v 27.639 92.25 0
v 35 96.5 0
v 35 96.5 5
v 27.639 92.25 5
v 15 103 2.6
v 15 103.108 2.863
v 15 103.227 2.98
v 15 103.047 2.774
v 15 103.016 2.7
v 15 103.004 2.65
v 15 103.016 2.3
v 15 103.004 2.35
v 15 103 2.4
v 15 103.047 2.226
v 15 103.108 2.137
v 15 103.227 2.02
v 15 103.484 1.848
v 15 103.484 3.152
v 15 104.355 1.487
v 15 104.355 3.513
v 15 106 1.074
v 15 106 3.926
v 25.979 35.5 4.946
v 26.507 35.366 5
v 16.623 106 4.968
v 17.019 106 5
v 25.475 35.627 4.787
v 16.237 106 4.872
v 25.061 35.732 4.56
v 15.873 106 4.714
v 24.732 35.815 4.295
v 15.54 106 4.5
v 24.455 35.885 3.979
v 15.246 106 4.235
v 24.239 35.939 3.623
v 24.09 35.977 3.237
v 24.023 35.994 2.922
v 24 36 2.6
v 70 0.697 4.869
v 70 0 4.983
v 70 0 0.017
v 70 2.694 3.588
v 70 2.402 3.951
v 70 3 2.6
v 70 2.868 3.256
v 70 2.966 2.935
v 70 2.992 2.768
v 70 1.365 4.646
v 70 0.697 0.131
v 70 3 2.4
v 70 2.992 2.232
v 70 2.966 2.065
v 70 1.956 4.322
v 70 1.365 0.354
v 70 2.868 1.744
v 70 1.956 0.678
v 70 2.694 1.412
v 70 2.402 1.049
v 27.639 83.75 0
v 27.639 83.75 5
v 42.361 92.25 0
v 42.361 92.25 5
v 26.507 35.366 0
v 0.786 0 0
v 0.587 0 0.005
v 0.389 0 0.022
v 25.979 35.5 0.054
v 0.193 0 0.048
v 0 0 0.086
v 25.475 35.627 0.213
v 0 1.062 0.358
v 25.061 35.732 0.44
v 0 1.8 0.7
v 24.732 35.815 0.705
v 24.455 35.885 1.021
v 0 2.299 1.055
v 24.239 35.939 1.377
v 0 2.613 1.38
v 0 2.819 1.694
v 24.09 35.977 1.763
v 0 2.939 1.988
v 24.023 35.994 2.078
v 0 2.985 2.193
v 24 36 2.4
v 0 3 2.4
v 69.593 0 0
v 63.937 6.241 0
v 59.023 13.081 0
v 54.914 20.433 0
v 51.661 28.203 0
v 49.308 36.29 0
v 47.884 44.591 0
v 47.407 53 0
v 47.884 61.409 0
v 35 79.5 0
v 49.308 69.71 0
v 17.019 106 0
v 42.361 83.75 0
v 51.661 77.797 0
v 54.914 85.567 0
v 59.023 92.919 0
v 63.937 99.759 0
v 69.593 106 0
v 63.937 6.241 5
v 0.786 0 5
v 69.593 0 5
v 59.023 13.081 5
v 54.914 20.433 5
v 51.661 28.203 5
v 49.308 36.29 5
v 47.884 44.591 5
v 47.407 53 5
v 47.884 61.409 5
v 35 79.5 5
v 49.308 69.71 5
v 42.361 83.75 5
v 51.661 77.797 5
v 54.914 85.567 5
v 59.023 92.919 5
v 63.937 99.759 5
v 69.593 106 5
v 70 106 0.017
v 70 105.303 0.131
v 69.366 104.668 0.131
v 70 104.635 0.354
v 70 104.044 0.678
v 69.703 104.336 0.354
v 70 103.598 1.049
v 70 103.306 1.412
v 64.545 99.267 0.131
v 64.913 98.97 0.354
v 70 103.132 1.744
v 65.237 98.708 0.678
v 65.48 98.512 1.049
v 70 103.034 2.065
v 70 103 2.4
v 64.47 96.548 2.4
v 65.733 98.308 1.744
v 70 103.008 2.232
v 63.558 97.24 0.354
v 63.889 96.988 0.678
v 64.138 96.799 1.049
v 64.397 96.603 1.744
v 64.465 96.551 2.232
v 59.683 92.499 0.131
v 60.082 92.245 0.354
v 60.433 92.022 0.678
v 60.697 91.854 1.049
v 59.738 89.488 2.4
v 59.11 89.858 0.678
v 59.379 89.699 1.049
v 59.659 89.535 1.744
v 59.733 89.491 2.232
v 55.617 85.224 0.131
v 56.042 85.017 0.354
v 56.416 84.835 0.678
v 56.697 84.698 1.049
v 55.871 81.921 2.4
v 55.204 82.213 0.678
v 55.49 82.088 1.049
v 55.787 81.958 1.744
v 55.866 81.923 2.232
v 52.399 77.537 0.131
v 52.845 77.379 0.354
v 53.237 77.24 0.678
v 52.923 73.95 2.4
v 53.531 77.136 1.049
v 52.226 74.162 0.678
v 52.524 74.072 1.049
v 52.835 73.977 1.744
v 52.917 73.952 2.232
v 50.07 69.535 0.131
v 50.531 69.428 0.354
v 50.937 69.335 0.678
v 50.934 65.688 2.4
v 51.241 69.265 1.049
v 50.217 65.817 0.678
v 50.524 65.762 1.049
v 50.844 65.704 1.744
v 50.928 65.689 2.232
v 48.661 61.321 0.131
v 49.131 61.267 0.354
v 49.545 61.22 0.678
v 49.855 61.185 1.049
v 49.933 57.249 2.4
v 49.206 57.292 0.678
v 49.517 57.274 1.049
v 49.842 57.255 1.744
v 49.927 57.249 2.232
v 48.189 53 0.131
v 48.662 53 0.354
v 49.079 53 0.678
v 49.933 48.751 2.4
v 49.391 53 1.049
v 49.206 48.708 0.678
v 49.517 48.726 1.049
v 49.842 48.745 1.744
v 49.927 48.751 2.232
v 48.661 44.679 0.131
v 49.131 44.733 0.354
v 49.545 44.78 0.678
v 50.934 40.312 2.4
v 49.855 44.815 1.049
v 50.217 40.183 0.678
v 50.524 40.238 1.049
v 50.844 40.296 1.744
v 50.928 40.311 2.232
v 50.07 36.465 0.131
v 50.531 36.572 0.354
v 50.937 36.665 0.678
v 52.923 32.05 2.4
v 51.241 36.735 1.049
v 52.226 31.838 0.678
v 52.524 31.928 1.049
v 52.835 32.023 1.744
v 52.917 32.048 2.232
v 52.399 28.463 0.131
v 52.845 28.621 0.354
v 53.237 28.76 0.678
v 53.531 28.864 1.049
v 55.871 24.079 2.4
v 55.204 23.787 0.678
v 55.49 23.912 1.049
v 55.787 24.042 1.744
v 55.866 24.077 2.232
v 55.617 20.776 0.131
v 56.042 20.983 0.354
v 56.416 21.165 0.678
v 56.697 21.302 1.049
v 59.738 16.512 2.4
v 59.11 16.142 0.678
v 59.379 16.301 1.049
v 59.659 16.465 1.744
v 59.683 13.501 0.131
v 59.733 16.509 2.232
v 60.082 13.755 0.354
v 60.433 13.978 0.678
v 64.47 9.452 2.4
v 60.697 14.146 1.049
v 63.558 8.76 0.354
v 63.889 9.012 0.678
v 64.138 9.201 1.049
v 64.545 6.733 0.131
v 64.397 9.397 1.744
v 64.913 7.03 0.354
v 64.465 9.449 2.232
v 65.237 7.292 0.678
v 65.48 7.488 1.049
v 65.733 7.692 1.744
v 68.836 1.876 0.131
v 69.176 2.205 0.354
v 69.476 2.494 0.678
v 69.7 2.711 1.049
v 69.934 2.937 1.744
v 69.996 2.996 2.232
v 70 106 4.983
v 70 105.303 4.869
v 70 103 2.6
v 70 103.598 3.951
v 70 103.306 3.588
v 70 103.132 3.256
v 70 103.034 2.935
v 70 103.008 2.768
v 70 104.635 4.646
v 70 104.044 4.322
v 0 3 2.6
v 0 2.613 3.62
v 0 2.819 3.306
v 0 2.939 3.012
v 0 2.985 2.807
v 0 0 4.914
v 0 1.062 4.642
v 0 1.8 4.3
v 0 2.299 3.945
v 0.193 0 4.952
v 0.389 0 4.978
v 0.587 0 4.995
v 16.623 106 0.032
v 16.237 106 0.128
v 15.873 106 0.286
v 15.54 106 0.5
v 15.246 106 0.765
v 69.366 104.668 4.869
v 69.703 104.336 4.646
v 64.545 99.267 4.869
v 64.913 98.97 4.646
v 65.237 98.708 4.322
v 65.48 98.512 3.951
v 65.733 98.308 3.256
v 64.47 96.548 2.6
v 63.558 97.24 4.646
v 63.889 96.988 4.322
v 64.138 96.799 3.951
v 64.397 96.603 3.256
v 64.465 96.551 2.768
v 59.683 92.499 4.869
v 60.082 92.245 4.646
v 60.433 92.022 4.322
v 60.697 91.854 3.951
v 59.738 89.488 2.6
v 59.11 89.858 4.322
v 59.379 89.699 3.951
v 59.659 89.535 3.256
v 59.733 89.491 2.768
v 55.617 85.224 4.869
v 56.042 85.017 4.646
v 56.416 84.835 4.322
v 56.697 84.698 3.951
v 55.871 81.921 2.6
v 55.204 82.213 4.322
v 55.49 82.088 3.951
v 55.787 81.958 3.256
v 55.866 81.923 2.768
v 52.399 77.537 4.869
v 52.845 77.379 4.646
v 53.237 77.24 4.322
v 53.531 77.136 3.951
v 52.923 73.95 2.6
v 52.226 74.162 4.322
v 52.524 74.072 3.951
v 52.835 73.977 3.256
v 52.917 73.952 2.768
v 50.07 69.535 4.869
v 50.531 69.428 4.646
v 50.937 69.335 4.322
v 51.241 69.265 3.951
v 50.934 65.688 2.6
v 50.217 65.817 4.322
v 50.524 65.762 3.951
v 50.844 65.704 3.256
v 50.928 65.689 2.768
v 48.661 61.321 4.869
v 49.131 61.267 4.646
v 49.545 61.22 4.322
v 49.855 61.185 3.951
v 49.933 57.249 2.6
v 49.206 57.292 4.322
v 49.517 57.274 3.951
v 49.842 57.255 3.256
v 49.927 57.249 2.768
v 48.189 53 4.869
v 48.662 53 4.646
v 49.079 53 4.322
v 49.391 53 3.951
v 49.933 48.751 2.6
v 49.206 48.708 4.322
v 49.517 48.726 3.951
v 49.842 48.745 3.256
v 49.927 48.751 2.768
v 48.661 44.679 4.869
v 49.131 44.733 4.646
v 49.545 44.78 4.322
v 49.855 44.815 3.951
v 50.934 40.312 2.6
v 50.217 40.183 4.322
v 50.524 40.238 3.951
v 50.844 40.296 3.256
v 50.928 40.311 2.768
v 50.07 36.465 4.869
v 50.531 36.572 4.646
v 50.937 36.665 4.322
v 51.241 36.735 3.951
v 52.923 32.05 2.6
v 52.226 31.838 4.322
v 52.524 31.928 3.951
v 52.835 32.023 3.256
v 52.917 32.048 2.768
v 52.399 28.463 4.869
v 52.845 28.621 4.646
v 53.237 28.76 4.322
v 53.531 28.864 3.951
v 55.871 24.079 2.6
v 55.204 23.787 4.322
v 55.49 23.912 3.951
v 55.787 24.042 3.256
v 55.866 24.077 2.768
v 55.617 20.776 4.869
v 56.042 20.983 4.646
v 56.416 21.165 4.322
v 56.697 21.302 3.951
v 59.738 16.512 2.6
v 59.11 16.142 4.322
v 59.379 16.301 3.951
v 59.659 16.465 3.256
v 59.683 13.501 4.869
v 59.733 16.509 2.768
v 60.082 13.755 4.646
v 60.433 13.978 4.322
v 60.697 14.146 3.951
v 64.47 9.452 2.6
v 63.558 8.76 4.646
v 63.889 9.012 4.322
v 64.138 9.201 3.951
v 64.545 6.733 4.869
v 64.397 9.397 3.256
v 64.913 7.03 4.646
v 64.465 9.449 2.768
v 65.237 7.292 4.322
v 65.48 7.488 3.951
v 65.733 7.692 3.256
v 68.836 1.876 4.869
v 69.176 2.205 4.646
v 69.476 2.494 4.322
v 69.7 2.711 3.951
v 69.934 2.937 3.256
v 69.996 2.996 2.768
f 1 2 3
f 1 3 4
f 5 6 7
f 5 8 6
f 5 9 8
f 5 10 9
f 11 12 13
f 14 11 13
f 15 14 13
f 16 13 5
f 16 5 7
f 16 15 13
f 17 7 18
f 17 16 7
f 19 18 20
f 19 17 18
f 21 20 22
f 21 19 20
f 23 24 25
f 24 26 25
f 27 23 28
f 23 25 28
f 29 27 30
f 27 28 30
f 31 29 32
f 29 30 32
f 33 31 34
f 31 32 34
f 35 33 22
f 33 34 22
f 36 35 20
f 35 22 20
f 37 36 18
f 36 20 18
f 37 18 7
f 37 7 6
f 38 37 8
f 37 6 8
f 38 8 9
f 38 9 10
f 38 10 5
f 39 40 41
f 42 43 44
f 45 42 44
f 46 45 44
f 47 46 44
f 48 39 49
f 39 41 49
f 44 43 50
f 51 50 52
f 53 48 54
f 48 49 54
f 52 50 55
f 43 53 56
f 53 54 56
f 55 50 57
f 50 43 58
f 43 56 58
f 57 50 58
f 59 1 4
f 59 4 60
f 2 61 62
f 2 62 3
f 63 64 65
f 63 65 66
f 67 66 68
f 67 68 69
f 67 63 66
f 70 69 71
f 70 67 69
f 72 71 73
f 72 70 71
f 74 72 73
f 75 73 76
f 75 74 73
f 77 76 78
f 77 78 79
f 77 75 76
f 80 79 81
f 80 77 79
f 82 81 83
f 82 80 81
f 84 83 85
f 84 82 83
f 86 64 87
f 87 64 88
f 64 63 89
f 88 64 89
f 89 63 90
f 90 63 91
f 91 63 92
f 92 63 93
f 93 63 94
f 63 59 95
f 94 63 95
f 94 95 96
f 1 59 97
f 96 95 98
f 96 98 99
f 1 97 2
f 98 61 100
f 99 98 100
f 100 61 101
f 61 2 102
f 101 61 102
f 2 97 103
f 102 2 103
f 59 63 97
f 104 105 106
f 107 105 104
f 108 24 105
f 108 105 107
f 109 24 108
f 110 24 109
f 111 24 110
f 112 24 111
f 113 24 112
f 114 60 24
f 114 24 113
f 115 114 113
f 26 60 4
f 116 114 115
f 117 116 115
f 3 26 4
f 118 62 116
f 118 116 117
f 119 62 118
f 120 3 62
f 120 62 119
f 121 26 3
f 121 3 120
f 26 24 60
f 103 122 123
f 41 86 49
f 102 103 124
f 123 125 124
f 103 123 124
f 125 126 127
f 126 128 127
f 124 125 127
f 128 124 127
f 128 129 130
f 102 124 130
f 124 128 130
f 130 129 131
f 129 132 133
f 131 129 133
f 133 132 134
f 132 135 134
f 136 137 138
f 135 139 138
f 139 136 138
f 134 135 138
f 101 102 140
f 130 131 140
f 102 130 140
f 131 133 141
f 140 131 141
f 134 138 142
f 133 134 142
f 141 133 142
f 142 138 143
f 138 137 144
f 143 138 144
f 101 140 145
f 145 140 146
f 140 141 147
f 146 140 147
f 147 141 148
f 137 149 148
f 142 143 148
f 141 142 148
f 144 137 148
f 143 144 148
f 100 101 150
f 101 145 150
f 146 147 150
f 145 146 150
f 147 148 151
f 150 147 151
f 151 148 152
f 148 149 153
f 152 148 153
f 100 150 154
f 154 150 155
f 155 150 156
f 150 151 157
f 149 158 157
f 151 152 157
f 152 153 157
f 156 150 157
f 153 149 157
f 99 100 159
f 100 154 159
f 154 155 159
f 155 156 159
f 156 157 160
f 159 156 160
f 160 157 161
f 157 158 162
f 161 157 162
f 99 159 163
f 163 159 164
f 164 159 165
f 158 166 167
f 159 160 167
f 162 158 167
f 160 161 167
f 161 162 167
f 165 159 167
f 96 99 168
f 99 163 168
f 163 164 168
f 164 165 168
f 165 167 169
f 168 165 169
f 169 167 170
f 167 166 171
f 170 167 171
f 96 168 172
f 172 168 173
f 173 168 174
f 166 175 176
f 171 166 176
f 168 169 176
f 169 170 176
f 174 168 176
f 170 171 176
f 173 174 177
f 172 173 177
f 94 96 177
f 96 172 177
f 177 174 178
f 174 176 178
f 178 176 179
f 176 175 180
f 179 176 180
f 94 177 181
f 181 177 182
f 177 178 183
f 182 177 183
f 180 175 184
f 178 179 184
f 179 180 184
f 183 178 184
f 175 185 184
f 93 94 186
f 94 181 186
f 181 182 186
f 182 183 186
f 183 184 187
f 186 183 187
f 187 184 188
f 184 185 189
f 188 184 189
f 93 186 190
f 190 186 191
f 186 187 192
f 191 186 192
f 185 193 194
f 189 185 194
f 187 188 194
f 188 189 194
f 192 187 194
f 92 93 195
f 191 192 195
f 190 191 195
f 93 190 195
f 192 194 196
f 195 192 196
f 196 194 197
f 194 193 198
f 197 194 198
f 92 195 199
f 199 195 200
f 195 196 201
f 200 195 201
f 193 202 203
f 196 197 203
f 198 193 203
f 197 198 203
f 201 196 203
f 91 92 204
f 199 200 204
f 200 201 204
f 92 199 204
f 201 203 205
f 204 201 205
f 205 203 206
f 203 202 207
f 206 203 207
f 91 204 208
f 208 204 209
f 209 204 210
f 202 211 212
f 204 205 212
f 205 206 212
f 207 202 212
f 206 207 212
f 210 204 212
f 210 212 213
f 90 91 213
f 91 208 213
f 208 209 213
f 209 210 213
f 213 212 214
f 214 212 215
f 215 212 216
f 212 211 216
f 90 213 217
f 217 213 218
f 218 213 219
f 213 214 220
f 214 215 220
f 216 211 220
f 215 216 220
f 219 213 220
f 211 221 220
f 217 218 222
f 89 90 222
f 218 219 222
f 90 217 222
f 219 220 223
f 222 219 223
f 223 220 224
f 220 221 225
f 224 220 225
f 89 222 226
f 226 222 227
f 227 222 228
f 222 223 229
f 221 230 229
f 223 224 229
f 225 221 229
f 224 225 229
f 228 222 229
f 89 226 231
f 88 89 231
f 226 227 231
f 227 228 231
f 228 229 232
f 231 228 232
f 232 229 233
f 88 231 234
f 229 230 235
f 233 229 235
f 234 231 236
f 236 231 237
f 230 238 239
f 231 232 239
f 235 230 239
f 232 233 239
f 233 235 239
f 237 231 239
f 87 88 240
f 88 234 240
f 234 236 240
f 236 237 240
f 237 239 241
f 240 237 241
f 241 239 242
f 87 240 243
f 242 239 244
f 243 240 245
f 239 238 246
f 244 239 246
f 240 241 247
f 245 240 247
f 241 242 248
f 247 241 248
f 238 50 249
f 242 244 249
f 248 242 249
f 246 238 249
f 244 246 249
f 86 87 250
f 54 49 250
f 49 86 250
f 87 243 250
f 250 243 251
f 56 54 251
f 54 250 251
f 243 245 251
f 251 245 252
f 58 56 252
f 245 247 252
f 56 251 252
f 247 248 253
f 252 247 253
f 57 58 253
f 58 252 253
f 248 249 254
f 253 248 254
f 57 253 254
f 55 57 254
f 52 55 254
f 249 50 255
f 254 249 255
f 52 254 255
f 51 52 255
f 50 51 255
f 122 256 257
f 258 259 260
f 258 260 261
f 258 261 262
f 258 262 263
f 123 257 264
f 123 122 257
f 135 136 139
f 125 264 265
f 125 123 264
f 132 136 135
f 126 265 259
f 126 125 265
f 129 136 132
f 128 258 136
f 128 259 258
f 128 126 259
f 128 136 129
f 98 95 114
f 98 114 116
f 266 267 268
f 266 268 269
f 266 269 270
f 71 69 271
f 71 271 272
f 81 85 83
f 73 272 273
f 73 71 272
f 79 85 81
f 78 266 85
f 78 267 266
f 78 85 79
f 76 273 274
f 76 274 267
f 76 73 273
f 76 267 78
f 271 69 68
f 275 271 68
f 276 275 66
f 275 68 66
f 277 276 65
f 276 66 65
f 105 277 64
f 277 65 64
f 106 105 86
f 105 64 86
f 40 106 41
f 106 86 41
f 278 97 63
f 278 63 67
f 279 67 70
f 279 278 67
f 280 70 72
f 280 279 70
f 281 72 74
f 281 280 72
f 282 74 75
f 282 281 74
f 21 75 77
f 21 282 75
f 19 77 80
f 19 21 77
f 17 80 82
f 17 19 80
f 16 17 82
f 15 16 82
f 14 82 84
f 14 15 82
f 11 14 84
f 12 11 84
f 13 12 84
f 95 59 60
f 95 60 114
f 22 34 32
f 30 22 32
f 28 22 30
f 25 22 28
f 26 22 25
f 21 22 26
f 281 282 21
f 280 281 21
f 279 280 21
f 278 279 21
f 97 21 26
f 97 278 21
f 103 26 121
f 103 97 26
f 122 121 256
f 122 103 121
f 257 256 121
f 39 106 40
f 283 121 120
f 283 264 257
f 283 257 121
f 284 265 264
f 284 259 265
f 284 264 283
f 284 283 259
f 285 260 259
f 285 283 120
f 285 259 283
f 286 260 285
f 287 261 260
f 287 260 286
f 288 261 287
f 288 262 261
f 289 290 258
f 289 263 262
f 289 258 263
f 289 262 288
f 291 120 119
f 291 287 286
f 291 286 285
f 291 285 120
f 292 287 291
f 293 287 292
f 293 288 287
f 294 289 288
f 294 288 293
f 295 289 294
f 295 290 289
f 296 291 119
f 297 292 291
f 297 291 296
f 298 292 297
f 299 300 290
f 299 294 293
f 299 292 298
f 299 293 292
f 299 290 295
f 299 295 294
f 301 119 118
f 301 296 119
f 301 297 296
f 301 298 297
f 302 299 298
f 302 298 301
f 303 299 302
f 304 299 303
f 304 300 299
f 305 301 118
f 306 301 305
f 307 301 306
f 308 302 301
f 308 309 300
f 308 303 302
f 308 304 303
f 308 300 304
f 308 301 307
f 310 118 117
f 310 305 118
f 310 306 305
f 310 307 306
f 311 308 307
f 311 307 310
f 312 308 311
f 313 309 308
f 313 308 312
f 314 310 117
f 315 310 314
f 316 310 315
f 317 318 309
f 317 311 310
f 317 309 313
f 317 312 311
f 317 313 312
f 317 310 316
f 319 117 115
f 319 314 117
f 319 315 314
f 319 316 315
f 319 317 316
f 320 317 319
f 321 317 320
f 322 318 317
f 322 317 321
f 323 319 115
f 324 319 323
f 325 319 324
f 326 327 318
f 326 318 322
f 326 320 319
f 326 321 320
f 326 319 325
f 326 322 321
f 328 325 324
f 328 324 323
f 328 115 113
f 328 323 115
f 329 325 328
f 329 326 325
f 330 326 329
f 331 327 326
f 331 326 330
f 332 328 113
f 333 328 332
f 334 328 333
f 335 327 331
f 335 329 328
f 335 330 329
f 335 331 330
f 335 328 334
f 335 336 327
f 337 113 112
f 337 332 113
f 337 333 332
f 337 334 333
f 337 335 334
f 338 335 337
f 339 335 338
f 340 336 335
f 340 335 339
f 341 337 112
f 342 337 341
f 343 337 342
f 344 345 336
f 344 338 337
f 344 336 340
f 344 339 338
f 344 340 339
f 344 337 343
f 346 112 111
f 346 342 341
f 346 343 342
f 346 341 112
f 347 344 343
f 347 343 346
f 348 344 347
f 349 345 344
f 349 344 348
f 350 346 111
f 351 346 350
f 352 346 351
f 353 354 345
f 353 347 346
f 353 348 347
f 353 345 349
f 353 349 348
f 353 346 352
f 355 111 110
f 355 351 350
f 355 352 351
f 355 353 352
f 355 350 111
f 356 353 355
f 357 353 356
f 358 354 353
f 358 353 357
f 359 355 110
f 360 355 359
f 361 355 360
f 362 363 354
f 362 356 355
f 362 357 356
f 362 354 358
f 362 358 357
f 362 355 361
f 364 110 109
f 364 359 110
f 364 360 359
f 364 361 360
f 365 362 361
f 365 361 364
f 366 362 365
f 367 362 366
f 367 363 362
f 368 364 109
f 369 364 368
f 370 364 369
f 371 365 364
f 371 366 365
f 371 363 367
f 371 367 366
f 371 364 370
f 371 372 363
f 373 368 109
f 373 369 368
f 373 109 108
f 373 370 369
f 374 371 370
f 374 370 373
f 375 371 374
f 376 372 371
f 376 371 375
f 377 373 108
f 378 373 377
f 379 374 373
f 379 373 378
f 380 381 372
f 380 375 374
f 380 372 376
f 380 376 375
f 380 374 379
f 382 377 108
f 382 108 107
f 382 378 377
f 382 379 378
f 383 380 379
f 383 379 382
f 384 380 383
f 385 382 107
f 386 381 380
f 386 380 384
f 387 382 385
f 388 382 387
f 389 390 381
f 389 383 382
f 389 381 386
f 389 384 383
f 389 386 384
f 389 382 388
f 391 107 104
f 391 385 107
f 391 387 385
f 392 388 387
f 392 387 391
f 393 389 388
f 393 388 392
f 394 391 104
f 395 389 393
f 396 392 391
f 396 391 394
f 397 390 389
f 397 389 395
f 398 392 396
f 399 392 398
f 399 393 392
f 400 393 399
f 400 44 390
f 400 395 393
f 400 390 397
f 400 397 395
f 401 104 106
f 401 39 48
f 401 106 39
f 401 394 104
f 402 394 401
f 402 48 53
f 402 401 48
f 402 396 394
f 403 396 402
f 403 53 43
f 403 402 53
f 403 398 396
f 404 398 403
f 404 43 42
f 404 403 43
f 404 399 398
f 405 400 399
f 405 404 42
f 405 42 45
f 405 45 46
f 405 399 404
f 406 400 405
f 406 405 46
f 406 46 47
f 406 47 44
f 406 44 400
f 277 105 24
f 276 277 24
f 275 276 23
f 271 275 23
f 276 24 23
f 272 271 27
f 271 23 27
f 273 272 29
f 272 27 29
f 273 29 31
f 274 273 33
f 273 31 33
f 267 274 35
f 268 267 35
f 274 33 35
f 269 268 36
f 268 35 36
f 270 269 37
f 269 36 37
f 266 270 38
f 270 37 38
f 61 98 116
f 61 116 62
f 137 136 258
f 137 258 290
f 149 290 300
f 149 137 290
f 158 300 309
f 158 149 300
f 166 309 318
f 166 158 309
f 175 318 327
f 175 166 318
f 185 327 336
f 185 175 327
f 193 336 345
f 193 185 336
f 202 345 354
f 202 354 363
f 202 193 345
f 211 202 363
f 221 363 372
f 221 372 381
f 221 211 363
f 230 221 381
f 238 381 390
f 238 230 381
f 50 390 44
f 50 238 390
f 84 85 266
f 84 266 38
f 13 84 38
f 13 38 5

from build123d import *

# Parameters (mm, degrees)
PAD_DEPTH    = 5
POCKET_DEPTH = 5
FILLET_R     = 2.4
FILLET001_R  = 2.4


with BuildPart() as part:
    # Sketch → Pad (new body)
    with BuildSketch(Plane.XY):
        with BuildLine():
            Line((0, 0), (70, 0))
            Line((70, 0), (70, 3))
            ThreePointArc((70, 103), (49.807335, 53), (70, 3))
            Line((70, 106), (70, 103))
            Line((15, 106), (70, 106))
            Line((15, 103), (15, 106))
            Line((24, 36), (15, 103))
            Line((0, 3), (24, 36))
            Line((0, 0), (0, 3))
        make_face()
    extrude(amount=PAD_DEPTH)

    # Sketch001 → Pocket (cut)
    with BuildSketch(Plane.XY):
        Polygon((35, 96.5), (27.638784, 92.25), (27.638784, 83.75), (35, 79.5), (42.361216, 83.75), (42.361216, 92.25), align=None)
    extrude(amount=POCKET_DEPTH, mode=Mode.SUBTRACT)

    # Fillet
    fillet_edges = [part.edges().sort_by_distance(p)[0] for p in [
        (49.807335, 53, 5),
        (49.807335, 53, 0),
    ]]
    fillet(fillet_edges, radius=FILLET_R)

    # Fillet001
    fillet001_edges = [part.edges().sort_by_distance(p)[0] for p in [
        (19.5, 69.5, 5),
        (19.5, 69.5, 0),
        (12, 19.5, 5),
        (12, 19.5, 0),
    ]]
    fillet(fillet001_edges, radius=FILLET001_R)


solid = part.part
